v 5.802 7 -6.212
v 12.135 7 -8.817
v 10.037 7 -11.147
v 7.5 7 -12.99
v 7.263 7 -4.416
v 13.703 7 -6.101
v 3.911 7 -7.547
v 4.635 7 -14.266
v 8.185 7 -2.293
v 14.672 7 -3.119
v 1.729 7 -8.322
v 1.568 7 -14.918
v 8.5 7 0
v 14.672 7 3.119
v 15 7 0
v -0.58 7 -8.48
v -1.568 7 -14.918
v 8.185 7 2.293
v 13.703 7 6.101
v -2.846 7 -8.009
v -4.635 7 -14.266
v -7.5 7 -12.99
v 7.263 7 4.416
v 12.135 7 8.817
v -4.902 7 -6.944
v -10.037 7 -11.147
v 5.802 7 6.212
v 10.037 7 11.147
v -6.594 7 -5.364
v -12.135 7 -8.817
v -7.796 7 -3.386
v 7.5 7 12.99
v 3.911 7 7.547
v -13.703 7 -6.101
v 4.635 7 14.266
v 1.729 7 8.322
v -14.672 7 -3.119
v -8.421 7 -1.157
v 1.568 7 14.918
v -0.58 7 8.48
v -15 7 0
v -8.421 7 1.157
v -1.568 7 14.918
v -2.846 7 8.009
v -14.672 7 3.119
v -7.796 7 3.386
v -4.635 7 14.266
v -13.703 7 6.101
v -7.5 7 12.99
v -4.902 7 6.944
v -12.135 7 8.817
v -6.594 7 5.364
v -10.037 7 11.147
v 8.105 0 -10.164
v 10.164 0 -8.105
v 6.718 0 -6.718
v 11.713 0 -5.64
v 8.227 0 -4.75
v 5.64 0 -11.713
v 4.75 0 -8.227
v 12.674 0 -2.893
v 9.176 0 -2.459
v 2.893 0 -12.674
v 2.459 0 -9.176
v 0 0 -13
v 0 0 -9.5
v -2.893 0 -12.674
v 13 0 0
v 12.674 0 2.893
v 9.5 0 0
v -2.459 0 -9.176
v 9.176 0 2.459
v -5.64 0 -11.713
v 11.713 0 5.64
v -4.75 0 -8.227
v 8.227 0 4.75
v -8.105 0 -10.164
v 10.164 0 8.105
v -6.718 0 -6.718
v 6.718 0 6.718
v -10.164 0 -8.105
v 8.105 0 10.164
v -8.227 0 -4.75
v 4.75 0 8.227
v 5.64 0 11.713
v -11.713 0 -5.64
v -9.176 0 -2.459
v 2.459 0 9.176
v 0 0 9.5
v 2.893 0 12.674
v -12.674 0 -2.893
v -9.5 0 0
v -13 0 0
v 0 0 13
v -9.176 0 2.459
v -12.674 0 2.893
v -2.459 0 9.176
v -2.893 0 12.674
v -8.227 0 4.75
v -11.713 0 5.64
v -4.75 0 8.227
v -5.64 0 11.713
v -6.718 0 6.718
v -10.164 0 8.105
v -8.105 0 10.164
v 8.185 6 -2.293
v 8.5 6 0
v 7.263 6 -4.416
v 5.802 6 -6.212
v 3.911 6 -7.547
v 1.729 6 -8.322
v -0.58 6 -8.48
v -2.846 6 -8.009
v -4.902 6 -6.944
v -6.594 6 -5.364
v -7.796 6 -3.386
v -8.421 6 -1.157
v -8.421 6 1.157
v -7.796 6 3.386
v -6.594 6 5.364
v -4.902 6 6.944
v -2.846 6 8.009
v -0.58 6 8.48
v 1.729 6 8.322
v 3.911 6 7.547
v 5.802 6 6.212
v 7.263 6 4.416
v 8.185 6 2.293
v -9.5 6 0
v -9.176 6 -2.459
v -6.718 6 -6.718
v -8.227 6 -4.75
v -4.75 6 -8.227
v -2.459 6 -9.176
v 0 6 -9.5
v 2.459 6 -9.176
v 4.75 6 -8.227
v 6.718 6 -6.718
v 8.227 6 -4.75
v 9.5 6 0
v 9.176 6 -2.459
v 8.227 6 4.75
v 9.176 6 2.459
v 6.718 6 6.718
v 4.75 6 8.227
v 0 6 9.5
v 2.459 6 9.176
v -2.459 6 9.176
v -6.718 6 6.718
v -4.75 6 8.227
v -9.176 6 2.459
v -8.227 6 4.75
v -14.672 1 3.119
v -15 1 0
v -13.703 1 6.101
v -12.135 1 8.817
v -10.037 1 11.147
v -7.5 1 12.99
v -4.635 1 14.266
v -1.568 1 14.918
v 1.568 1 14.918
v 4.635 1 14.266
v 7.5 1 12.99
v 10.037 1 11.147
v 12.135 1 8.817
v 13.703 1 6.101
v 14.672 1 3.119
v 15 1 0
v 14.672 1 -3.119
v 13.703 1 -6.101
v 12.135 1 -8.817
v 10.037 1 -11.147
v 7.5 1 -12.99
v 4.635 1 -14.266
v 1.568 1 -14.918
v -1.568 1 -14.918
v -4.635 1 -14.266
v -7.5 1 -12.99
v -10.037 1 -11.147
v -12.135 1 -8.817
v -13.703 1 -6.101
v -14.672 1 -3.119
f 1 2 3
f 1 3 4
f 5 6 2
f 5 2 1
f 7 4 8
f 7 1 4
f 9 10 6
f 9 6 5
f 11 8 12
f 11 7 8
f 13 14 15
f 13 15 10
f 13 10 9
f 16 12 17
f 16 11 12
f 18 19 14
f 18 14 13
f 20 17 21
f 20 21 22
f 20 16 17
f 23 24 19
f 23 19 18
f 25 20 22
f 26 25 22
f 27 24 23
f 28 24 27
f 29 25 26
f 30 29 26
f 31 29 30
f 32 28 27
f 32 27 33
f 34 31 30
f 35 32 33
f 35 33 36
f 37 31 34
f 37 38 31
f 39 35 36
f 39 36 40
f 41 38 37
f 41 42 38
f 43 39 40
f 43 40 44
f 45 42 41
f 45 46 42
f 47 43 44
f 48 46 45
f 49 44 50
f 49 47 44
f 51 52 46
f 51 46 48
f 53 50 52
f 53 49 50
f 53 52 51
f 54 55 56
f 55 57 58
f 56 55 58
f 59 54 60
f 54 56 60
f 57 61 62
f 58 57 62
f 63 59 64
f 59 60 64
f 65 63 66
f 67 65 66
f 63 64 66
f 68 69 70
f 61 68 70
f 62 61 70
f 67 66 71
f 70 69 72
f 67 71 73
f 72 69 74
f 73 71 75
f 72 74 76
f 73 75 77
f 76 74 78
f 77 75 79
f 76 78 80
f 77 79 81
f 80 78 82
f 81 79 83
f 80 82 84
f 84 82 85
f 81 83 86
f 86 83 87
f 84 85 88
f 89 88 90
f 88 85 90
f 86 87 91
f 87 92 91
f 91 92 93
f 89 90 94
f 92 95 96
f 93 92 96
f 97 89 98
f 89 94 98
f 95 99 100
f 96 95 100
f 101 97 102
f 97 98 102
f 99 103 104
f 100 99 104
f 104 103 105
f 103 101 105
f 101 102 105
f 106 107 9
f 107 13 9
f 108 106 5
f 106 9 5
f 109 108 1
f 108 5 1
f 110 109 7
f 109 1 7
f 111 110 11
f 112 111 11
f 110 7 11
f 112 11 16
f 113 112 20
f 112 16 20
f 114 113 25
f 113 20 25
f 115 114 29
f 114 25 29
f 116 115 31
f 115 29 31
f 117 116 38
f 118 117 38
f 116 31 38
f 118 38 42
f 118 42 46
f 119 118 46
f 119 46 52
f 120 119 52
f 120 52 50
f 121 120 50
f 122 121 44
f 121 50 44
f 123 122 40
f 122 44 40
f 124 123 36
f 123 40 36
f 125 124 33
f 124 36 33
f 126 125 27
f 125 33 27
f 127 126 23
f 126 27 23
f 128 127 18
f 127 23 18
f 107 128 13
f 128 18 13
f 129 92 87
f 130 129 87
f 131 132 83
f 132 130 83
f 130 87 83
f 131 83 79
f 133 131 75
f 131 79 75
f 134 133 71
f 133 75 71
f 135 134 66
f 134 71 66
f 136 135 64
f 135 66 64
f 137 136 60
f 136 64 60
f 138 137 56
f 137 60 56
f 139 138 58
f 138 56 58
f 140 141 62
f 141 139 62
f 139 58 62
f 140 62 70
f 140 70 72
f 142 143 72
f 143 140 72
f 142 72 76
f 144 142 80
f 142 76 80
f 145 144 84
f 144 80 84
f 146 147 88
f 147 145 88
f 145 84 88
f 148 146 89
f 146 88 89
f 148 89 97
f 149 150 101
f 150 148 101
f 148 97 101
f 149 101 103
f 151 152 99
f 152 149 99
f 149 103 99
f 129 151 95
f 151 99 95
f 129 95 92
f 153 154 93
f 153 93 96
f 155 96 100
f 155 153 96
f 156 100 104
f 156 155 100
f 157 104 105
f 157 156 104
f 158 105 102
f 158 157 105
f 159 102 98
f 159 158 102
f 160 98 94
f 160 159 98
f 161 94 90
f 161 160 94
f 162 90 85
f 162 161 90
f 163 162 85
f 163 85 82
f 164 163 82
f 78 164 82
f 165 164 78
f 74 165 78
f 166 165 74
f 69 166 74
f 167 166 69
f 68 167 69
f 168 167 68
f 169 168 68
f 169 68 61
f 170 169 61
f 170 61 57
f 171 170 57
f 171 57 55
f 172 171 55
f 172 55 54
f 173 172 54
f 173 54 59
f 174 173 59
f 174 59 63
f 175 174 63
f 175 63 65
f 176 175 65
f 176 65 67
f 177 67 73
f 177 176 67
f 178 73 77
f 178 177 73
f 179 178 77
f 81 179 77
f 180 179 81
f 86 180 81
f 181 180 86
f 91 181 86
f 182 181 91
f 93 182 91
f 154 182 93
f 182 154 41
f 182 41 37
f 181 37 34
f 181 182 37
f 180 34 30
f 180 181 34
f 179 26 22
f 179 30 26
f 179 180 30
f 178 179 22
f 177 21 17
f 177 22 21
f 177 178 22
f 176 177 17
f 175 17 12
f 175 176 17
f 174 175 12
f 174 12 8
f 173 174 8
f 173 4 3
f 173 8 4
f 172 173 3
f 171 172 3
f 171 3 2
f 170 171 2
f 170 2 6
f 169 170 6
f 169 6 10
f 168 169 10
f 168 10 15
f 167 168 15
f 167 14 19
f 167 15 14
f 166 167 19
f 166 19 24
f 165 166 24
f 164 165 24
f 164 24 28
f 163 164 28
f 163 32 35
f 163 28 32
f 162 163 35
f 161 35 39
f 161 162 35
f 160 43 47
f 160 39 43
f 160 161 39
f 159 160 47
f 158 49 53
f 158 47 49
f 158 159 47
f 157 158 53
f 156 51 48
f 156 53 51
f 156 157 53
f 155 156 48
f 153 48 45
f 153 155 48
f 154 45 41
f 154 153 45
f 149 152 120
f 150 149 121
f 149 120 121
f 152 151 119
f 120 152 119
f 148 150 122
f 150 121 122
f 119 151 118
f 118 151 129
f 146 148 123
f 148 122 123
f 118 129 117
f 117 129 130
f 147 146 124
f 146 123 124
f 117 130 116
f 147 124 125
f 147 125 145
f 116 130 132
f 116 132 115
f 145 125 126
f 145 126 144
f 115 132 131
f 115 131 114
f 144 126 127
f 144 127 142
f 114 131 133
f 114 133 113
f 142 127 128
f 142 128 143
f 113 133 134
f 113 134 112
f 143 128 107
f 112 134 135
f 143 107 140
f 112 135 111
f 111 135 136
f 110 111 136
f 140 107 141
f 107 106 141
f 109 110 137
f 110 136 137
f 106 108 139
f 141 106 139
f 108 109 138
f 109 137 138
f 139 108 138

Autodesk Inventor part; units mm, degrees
ref_plane "YZ Plane" through (0, 0, 0) normal (1, 0, 0) x (0, 1, 0)
ref_plane "XZ Plane" through (0, 0, 0) normal (0, 1, 0) x (-1, 0, 0)
ref_plane "XY Plane" through (0, 0, 0) normal (0, 0, 1) x (1, 0, 0)
sketch "Szkic1" plane through (0, 0, 0) normal (0, 1, 0) x (-1, 0, 0)
  circle A0 centre (0, 0) radius 9.5
  circle A1 centre (0, 0) radius 15
  dimension "d0" = 19
  dimension "d3" = 30
extrude "Wyciągnięcie proste1" add sketch "Szkic1" along normal blind 7
sketch "Szkic2" plane through (0, 7, 0) normal (0, 1, 0) x (1, 0, 0)
  circle A0 centre (0, 0) radius 9.5
  circle A1 centre (0, 0) radius 8.5
  dimension "d4" = 19
  dimension "d5" = 17
extrude "Wyciągnięcie proste2" add sketch "Szkic2" against normal blind 1
chamfer "Faza1" distance 1 distance2 2 1 edges at (15, 0, 0) measured on face at (-14.8058, 4.6667, -2.4062)
properties part number "opona_nosne_dummie" material "Aluminum 6061"
